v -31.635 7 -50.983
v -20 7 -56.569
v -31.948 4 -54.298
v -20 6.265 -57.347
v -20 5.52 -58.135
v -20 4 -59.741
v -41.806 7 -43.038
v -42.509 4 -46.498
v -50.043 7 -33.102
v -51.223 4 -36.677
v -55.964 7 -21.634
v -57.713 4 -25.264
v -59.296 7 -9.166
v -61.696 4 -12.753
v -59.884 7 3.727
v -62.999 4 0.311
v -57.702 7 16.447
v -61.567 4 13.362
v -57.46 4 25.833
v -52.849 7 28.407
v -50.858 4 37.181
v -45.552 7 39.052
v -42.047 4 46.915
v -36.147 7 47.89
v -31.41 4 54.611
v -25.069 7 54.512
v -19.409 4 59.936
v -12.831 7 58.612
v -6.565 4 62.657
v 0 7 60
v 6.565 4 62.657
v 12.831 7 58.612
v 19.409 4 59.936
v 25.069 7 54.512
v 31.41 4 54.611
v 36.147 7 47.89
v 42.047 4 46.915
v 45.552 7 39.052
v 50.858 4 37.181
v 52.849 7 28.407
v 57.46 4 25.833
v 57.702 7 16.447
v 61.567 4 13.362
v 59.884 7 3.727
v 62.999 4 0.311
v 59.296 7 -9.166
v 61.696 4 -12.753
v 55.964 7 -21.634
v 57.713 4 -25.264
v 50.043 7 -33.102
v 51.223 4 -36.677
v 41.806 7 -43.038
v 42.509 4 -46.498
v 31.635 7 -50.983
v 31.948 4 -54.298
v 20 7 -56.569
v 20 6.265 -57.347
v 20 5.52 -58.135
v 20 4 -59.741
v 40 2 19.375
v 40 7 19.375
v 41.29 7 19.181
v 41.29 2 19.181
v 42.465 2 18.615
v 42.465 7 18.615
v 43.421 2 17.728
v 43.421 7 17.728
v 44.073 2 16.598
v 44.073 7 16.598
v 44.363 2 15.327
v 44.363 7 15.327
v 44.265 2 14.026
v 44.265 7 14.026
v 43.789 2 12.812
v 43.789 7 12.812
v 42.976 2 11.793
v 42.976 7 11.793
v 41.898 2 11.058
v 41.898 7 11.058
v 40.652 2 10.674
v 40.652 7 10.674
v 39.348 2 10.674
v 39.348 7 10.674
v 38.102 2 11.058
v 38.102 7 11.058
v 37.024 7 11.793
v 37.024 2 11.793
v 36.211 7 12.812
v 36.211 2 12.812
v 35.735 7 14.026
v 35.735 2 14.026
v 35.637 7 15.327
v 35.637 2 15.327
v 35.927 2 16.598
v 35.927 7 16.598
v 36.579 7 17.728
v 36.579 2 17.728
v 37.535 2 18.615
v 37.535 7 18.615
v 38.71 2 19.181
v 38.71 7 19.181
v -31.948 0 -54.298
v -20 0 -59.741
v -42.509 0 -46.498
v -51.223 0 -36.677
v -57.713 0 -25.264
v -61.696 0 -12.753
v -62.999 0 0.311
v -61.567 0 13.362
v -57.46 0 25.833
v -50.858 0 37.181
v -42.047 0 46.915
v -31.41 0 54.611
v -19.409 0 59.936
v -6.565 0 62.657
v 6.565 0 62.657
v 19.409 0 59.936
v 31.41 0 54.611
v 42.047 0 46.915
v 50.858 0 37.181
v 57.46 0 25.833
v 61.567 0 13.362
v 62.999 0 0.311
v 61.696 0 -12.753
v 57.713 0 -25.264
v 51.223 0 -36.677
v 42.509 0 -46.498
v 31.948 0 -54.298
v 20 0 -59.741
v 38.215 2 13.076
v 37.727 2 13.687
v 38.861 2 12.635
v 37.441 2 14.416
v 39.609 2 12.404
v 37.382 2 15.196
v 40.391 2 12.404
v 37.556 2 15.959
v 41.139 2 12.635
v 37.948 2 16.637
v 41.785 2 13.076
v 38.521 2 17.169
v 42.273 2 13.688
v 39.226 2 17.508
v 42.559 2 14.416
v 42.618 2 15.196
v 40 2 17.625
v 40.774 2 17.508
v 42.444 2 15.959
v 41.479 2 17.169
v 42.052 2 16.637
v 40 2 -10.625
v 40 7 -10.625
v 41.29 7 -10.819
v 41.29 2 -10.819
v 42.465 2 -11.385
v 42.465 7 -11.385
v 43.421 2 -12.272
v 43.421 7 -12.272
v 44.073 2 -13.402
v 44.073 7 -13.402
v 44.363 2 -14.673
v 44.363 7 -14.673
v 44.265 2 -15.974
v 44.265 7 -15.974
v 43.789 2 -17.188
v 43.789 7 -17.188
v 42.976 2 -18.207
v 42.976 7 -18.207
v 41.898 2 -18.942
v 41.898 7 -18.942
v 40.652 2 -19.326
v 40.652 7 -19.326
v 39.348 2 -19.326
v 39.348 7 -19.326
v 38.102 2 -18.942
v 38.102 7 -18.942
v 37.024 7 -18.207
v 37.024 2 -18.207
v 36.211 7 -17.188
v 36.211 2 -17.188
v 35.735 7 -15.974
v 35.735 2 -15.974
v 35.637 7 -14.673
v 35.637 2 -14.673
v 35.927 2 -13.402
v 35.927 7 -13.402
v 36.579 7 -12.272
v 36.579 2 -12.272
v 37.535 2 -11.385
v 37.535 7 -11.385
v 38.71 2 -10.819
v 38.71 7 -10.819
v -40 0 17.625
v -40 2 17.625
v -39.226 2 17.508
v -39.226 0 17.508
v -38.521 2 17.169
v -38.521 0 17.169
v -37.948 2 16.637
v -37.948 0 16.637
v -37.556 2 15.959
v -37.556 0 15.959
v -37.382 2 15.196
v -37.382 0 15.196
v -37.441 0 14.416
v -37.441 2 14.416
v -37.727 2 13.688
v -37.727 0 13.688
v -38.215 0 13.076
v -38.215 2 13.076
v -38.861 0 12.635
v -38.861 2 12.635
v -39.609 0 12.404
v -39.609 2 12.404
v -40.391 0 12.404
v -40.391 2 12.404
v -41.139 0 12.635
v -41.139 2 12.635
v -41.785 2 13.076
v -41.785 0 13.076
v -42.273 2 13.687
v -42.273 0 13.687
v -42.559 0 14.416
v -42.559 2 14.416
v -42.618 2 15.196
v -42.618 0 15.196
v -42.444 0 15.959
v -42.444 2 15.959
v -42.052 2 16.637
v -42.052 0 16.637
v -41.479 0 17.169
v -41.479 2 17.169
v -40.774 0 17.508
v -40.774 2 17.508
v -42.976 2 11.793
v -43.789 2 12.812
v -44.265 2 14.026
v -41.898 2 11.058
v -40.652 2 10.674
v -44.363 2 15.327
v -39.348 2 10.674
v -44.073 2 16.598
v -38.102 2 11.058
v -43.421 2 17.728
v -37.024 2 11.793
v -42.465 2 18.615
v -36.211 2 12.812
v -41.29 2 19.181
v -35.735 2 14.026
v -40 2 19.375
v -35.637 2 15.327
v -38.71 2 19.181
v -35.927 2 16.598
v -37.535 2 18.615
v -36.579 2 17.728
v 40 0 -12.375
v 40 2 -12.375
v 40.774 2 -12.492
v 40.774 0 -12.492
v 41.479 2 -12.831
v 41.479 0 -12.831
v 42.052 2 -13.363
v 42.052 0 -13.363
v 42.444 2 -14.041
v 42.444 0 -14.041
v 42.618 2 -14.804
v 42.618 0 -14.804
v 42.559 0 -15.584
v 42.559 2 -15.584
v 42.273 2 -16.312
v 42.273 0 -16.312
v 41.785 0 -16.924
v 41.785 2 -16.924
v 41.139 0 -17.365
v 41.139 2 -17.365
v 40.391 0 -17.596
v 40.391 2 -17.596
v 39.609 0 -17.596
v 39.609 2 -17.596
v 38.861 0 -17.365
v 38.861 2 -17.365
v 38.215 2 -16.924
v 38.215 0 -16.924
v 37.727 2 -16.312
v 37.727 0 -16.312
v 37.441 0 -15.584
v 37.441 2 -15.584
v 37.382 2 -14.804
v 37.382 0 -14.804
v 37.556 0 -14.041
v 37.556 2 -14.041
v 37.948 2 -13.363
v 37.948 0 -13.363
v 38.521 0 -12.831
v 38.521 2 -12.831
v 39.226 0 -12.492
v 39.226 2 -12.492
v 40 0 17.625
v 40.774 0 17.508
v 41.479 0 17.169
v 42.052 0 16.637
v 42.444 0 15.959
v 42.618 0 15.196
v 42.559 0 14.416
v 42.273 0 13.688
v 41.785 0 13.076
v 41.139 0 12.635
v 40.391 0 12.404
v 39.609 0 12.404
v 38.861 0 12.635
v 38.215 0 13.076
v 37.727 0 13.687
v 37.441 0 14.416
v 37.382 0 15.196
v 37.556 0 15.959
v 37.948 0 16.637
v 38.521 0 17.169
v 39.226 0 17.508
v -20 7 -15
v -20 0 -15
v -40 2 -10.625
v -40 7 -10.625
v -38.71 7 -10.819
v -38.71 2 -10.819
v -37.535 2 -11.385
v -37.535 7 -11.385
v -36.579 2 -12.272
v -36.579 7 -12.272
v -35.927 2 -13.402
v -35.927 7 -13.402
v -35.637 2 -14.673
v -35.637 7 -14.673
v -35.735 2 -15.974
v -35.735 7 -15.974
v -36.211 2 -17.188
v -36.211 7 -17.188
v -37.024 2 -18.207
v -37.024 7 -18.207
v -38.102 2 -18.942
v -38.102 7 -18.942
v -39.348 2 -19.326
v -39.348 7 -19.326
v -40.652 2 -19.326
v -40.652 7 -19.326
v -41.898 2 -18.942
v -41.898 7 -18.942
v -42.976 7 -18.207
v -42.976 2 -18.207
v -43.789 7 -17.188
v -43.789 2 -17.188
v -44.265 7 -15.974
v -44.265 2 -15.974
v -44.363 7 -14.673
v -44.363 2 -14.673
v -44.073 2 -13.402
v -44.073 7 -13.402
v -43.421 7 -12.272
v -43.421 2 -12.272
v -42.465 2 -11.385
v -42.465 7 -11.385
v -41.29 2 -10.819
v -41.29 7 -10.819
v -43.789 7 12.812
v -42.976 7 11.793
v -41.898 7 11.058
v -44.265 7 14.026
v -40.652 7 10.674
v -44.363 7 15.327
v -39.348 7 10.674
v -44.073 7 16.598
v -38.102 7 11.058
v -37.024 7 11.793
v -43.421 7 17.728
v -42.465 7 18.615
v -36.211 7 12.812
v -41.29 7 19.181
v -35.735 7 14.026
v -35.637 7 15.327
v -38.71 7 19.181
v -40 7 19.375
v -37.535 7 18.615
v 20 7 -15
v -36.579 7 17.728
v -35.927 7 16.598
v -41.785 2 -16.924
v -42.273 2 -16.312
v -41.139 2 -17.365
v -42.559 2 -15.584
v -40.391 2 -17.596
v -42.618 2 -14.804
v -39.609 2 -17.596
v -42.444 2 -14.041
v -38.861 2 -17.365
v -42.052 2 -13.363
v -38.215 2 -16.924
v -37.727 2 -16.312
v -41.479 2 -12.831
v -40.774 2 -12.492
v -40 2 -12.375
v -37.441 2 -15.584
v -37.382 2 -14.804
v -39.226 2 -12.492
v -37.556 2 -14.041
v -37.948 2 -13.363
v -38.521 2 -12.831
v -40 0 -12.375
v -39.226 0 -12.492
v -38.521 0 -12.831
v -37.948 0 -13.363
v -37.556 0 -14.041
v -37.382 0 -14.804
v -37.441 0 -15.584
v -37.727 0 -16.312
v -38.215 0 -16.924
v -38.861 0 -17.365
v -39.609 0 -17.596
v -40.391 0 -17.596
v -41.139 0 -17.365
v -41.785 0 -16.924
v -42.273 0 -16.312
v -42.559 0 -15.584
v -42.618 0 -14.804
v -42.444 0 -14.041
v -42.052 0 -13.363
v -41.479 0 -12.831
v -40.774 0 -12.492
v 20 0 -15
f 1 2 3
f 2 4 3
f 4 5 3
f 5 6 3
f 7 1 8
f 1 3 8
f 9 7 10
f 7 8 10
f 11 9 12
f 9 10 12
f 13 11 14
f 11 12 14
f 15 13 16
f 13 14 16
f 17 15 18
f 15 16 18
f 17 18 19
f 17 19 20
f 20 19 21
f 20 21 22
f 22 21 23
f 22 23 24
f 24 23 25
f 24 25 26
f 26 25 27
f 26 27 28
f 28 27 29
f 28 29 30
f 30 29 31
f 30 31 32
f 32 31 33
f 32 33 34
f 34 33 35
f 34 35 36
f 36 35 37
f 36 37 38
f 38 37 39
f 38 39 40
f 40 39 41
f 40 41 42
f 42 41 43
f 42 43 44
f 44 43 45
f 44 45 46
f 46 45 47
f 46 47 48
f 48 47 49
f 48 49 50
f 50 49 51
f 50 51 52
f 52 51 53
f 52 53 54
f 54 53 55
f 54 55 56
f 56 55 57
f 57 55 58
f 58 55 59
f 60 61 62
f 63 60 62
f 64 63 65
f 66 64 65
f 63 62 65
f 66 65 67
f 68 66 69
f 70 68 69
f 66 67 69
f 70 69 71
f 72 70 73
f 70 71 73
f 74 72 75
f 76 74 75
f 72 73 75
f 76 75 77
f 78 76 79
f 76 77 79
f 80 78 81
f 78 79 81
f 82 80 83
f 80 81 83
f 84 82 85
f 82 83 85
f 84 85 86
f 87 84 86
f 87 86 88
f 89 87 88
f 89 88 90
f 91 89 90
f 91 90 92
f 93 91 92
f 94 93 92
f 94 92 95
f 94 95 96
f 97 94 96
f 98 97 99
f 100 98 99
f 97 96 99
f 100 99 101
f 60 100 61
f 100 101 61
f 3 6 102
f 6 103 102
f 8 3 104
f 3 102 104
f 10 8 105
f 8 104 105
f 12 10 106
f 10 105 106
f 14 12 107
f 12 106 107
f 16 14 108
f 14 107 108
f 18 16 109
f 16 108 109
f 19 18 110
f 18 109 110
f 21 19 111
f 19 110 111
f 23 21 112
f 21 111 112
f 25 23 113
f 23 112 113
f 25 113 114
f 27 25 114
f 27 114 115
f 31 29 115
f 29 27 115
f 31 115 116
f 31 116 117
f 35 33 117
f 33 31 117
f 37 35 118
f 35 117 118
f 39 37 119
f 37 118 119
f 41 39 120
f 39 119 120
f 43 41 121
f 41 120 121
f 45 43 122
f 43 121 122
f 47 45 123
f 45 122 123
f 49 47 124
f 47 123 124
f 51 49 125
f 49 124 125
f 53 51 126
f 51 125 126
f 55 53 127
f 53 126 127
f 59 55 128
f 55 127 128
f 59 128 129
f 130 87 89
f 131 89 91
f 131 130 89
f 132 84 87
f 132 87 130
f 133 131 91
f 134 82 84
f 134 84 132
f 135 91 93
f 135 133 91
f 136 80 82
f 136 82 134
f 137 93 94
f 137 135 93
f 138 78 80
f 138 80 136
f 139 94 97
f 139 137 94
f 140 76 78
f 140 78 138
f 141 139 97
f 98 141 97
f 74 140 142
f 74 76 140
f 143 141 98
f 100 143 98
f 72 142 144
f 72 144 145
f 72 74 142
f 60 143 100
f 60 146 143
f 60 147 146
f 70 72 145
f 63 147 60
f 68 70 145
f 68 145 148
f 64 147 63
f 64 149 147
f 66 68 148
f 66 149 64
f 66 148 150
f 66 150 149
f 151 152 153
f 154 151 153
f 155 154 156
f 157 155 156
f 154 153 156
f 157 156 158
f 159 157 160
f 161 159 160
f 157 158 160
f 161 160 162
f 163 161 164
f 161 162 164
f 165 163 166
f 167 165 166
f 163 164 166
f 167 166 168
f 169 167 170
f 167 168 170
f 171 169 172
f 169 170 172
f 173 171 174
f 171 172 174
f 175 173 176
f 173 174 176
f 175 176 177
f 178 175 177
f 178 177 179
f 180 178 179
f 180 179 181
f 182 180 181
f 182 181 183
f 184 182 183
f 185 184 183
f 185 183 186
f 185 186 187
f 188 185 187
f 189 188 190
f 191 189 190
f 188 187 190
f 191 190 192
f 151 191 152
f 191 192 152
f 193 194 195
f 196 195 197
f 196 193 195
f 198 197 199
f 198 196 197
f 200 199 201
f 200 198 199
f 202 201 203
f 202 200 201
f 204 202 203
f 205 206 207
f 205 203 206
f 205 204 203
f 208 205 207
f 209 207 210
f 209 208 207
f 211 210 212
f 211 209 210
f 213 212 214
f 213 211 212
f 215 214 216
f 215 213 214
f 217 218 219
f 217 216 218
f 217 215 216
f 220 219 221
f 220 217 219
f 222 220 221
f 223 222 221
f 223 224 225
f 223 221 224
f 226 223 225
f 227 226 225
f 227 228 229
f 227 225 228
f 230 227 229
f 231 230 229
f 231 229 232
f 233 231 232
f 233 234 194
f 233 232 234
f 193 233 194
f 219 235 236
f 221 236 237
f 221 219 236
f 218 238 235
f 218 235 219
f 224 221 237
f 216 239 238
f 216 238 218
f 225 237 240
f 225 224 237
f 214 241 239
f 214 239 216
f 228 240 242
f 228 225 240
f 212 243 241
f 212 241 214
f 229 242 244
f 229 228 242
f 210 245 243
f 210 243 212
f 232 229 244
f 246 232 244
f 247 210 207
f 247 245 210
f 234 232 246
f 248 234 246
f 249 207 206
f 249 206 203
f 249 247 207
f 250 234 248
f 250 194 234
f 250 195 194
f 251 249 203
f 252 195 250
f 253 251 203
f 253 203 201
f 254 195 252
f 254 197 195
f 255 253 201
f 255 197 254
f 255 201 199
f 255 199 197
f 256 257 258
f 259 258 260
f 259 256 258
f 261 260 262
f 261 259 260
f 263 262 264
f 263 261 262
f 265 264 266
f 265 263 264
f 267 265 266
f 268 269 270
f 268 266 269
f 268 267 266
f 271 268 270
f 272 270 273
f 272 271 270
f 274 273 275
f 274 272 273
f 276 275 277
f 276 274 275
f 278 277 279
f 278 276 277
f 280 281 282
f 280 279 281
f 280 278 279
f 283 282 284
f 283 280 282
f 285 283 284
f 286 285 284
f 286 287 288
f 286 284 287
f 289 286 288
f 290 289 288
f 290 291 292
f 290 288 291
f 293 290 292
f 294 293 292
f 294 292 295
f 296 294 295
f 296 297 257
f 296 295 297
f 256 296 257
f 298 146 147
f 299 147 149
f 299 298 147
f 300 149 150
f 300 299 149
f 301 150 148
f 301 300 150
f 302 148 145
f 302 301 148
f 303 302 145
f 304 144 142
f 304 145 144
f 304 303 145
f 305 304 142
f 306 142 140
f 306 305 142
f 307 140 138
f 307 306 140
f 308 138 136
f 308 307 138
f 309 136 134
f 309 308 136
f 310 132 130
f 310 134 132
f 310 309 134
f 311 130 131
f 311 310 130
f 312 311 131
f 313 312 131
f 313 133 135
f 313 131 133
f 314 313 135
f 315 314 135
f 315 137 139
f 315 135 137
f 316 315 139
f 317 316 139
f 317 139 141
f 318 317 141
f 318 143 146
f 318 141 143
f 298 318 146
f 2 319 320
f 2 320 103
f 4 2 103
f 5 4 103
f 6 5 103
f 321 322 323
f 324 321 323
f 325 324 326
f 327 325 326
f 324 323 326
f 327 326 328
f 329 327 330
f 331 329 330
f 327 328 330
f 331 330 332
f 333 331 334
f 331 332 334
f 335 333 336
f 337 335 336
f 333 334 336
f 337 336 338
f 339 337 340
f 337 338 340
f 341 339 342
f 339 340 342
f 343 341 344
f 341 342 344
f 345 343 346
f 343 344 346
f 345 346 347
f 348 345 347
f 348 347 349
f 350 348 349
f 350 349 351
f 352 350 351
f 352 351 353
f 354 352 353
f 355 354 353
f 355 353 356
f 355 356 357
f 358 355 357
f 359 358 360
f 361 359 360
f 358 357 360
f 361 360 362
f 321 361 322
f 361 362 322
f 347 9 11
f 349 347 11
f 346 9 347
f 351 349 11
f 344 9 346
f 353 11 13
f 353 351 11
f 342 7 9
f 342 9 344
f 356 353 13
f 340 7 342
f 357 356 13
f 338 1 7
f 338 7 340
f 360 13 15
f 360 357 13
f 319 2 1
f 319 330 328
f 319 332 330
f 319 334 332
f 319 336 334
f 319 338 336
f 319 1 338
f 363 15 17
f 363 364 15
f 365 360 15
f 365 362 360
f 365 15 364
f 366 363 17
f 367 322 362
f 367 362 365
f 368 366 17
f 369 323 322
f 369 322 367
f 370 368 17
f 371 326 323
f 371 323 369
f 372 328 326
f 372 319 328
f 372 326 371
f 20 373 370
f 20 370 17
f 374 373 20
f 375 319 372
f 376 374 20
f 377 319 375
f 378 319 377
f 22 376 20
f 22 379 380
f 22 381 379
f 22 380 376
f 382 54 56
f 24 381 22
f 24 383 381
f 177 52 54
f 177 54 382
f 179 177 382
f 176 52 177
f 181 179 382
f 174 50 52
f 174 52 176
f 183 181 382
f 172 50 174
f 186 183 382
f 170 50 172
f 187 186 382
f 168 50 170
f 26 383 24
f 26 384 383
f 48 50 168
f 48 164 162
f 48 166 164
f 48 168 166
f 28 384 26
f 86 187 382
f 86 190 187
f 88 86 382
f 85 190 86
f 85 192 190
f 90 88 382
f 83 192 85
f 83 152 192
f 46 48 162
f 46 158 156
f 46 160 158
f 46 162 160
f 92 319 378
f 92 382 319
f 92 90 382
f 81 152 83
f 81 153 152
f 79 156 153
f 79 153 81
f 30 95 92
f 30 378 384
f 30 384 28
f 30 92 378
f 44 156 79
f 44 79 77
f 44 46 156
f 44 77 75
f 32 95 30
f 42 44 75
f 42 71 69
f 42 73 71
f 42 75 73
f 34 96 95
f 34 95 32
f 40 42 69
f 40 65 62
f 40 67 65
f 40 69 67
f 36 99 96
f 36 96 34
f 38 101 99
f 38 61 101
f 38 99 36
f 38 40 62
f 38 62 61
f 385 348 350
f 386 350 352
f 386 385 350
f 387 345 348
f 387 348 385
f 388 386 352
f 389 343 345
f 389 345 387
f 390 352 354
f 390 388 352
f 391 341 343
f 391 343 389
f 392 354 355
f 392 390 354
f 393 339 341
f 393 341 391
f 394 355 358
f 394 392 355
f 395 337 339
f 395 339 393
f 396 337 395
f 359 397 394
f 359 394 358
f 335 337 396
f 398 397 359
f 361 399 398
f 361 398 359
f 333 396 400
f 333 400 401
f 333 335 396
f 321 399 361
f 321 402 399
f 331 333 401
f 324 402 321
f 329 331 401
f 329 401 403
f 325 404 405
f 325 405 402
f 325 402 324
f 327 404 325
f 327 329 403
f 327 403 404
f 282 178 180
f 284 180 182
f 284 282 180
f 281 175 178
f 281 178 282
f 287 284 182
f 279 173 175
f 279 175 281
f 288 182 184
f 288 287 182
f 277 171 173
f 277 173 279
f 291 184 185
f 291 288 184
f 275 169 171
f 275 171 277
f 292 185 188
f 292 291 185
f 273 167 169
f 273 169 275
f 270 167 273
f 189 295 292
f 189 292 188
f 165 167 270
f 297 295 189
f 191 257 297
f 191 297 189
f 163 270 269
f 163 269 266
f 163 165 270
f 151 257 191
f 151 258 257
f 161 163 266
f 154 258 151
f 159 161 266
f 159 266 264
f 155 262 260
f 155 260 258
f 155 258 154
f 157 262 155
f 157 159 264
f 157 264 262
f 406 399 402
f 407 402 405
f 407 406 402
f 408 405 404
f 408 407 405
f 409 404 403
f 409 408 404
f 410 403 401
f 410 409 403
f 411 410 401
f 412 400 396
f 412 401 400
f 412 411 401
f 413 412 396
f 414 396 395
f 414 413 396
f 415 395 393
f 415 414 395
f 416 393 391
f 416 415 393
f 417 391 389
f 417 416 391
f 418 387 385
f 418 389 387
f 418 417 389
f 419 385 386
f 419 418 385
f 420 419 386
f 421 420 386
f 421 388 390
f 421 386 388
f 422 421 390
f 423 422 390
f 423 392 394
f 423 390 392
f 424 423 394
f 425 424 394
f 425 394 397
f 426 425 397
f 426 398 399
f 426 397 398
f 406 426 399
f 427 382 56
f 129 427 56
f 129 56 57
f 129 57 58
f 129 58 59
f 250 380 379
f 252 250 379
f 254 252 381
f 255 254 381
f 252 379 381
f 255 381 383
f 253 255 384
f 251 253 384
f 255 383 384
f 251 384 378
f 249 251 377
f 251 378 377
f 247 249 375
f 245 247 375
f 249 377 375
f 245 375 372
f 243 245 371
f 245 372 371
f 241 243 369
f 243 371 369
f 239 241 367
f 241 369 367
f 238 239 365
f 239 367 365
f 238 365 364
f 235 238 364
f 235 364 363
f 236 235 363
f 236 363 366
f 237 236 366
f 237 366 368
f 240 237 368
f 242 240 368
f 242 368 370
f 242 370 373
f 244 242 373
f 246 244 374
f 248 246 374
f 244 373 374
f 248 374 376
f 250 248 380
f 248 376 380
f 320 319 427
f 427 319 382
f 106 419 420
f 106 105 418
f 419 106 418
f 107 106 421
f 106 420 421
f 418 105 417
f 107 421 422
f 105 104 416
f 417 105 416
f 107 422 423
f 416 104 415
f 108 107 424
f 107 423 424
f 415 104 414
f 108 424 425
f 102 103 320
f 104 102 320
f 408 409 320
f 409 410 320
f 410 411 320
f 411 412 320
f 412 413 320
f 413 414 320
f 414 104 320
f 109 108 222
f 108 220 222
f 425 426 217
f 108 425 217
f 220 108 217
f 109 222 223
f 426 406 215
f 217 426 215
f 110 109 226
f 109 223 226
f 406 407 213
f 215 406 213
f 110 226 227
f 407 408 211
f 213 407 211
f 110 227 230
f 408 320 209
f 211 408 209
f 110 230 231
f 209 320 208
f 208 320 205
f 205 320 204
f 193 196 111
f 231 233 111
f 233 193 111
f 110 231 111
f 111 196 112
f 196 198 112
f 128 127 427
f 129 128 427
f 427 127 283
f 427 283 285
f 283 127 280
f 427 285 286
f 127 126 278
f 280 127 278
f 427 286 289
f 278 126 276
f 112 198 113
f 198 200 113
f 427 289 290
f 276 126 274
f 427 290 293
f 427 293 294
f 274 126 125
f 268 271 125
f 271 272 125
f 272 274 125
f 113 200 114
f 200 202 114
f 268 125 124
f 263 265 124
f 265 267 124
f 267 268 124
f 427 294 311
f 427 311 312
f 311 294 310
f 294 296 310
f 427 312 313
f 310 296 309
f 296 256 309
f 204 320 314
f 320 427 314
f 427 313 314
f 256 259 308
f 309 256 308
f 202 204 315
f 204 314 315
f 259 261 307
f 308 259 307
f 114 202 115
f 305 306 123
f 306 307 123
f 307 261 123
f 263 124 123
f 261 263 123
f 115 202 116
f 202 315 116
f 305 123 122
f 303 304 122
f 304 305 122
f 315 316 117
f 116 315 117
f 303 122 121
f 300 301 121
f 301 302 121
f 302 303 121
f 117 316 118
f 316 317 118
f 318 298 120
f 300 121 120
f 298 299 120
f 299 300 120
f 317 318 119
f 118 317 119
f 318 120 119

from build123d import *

# Parameters (mm, degrees)
SKETCH1_R           = 63
SKETCH1_R_2         = 2.625
BOSS_EXTRUDE1_DEPTH = 7
SKETCH2_R           = 4.375
CUT_EXTRUDE1_DEPTH  = 5
CUT_EXTRUDE2_REACH  = 91.37
SKETCH3_W           = 40
SKETCH3_H           = 50


with BuildPart() as part:
    # Sketch1 → Boss-Extrude1 (new body)
    with BuildSketch(Plane(origin=(0, 0, 0), x_dir=(1, 0, 0), z_dir=(0, 1, 0))):
        with Locations(Location((0, 0, 0), (0, 0, 270))):
            Circle(SKETCH1_R)
        with Locations(Location((-40, 15, 0), (0, 0, 270))):
            Circle(SKETCH1_R_2, mode=Mode.SUBTRACT)
        with Locations(Location((-40, -15, 0), (0, 0, 270))):
            Circle(SKETCH1_R_2, mode=Mode.SUBTRACT)
        with Locations(Location((40, 15, 0), (0, 0, 270))):
            Circle(SKETCH1_R_2, mode=Mode.SUBTRACT)
        with Locations(Location((40, -15, 0), (0, 0, 270))):
            Circle(SKETCH1_R_2, mode=Mode.SUBTRACT)
    extrude(amount=BOSS_EXTRUDE1_DEPTH)

    # Sketch2 → Cut-Extrude1 (cut)
    with BuildSketch(Plane(origin=(0, 7, 0), x_dir=(1, 0, 0), z_dir=(0, 1, 0))):
        with Locations(Location((-40, 15, 0), (0, 0, 270))):
            Circle(SKETCH2_R)
        with Locations(Location((-40, -15, 0), (0, 0, 270))):
            Circle(SKETCH2_R)
        with Locations(Location((40, 15, 0), (0, 0, 270))):
            Circle(SKETCH2_R)
        with Locations(Location((40, -15, 0), (0, 0, 270))):
            Circle(SKETCH2_R)
    extrude(amount=-CUT_EXTRUDE1_DEPTH, mode=Mode.SUBTRACT)

    # Chamfer1: read off the stored shape, not the designer's step
    # Chamfer1 outline → Chamfer1 (revolve, cut)
    with BuildSketch(Plane.XY):
        Polygon((63, 7), (60, 7), (63, 4), align=None)
    revolve(axis=Axis((0, 0, 0), (0, 1, 0)), mode=Mode.SUBTRACT)

    # Cut-Extrude2: up to this face of the body (flat: up to its plane)
    cut_extrude2_end = Plane(part.part.faces().sort_by_distance((0, 0, 0))[0])
    # Sketch3 → Cut-Extrude2 (cut, up to the picked face)
    with BuildSketch(Plane(origin=(0, 7, 0), x_dir=(1, 0, 0), z_dir=(0, 1, 0)), mode=Mode.PRIVATE) as cut_extrude2_sk1:
        with Locations((0, 40)):
            Rectangle(SKETCH3_W, SKETCH3_H)
    cut_extrude2_tool1 = split(extrude(cut_extrude2_sk1.sketch, amount=-CUT_EXTRUDE2_REACH, mode=Mode.PRIVATE), bisect_by=cut_extrude2_end, keep=Keep.BOTH, mode=Mode.PRIVATE)
    add(cut_extrude2_tool1.solids().sort_by(Axis((0, 7, -40), (0, -1, 0)))[0], mode=Mode.SUBTRACT)


solid = part.part
